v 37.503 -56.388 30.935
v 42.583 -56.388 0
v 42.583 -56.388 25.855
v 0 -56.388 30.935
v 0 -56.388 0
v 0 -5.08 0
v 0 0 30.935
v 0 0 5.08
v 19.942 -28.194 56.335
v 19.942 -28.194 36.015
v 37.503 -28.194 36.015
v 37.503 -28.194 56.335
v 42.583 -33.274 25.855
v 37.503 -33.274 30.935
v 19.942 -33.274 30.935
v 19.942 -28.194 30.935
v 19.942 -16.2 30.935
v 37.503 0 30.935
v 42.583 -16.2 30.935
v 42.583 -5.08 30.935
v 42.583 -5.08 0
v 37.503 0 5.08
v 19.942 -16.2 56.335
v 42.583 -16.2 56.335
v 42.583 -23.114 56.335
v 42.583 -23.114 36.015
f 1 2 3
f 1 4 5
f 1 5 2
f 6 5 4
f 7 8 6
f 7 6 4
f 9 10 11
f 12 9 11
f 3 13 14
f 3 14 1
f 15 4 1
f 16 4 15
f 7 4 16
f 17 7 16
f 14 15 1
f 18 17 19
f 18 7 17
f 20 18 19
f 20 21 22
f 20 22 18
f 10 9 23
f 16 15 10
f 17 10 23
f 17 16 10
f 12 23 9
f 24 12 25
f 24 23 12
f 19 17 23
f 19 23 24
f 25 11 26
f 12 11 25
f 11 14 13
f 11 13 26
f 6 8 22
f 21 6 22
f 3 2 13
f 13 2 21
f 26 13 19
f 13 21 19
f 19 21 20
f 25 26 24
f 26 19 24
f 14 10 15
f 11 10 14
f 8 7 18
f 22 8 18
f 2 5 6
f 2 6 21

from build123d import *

# Parameters (mm, degrees)
F0_W     = 42.5828881562
F0_H     = 30.9346560389
F1_DEPTH = 56.388
F2_W     = 22.6413179189
F2_H     = 11.9935432317
F3_DEPTH = 25.4
F4_SIZE  = 5.08


with BuildPart() as f1:
    # F0 (on Front) → F1 (new body)
    with BuildSketch(Plane.XZ):
        with Locations((21.2914440781, 15.4673280194)):
            Rectangle(F0_W, F0_H)
    extrude(amount=F1_DEPTH)

    # F2 (on face) → F3 (join)
    with BuildSketch(Plane.XY.offset(30.9346560389)):
        with Locations((31.2622291967, -22.1972283841)):
            Rectangle(F2_W, F2_H)
    extrude(amount=F3_DEPTH)

    # F4
    f4_edges = [f1.edges().sort_by_distance(p)[0] for p in [
        (31.262229, -28.194, 30.934656),
        (42.582888, -42.291, 30.934656),
        (21.291444, 0, 0),
        (42.582888, 0, 15.467328),
        (42.582888, -28.194, 43.634656),
    ]]
    chamfer(f4_edges, length=F4_SIZE)


solid = f1.part
